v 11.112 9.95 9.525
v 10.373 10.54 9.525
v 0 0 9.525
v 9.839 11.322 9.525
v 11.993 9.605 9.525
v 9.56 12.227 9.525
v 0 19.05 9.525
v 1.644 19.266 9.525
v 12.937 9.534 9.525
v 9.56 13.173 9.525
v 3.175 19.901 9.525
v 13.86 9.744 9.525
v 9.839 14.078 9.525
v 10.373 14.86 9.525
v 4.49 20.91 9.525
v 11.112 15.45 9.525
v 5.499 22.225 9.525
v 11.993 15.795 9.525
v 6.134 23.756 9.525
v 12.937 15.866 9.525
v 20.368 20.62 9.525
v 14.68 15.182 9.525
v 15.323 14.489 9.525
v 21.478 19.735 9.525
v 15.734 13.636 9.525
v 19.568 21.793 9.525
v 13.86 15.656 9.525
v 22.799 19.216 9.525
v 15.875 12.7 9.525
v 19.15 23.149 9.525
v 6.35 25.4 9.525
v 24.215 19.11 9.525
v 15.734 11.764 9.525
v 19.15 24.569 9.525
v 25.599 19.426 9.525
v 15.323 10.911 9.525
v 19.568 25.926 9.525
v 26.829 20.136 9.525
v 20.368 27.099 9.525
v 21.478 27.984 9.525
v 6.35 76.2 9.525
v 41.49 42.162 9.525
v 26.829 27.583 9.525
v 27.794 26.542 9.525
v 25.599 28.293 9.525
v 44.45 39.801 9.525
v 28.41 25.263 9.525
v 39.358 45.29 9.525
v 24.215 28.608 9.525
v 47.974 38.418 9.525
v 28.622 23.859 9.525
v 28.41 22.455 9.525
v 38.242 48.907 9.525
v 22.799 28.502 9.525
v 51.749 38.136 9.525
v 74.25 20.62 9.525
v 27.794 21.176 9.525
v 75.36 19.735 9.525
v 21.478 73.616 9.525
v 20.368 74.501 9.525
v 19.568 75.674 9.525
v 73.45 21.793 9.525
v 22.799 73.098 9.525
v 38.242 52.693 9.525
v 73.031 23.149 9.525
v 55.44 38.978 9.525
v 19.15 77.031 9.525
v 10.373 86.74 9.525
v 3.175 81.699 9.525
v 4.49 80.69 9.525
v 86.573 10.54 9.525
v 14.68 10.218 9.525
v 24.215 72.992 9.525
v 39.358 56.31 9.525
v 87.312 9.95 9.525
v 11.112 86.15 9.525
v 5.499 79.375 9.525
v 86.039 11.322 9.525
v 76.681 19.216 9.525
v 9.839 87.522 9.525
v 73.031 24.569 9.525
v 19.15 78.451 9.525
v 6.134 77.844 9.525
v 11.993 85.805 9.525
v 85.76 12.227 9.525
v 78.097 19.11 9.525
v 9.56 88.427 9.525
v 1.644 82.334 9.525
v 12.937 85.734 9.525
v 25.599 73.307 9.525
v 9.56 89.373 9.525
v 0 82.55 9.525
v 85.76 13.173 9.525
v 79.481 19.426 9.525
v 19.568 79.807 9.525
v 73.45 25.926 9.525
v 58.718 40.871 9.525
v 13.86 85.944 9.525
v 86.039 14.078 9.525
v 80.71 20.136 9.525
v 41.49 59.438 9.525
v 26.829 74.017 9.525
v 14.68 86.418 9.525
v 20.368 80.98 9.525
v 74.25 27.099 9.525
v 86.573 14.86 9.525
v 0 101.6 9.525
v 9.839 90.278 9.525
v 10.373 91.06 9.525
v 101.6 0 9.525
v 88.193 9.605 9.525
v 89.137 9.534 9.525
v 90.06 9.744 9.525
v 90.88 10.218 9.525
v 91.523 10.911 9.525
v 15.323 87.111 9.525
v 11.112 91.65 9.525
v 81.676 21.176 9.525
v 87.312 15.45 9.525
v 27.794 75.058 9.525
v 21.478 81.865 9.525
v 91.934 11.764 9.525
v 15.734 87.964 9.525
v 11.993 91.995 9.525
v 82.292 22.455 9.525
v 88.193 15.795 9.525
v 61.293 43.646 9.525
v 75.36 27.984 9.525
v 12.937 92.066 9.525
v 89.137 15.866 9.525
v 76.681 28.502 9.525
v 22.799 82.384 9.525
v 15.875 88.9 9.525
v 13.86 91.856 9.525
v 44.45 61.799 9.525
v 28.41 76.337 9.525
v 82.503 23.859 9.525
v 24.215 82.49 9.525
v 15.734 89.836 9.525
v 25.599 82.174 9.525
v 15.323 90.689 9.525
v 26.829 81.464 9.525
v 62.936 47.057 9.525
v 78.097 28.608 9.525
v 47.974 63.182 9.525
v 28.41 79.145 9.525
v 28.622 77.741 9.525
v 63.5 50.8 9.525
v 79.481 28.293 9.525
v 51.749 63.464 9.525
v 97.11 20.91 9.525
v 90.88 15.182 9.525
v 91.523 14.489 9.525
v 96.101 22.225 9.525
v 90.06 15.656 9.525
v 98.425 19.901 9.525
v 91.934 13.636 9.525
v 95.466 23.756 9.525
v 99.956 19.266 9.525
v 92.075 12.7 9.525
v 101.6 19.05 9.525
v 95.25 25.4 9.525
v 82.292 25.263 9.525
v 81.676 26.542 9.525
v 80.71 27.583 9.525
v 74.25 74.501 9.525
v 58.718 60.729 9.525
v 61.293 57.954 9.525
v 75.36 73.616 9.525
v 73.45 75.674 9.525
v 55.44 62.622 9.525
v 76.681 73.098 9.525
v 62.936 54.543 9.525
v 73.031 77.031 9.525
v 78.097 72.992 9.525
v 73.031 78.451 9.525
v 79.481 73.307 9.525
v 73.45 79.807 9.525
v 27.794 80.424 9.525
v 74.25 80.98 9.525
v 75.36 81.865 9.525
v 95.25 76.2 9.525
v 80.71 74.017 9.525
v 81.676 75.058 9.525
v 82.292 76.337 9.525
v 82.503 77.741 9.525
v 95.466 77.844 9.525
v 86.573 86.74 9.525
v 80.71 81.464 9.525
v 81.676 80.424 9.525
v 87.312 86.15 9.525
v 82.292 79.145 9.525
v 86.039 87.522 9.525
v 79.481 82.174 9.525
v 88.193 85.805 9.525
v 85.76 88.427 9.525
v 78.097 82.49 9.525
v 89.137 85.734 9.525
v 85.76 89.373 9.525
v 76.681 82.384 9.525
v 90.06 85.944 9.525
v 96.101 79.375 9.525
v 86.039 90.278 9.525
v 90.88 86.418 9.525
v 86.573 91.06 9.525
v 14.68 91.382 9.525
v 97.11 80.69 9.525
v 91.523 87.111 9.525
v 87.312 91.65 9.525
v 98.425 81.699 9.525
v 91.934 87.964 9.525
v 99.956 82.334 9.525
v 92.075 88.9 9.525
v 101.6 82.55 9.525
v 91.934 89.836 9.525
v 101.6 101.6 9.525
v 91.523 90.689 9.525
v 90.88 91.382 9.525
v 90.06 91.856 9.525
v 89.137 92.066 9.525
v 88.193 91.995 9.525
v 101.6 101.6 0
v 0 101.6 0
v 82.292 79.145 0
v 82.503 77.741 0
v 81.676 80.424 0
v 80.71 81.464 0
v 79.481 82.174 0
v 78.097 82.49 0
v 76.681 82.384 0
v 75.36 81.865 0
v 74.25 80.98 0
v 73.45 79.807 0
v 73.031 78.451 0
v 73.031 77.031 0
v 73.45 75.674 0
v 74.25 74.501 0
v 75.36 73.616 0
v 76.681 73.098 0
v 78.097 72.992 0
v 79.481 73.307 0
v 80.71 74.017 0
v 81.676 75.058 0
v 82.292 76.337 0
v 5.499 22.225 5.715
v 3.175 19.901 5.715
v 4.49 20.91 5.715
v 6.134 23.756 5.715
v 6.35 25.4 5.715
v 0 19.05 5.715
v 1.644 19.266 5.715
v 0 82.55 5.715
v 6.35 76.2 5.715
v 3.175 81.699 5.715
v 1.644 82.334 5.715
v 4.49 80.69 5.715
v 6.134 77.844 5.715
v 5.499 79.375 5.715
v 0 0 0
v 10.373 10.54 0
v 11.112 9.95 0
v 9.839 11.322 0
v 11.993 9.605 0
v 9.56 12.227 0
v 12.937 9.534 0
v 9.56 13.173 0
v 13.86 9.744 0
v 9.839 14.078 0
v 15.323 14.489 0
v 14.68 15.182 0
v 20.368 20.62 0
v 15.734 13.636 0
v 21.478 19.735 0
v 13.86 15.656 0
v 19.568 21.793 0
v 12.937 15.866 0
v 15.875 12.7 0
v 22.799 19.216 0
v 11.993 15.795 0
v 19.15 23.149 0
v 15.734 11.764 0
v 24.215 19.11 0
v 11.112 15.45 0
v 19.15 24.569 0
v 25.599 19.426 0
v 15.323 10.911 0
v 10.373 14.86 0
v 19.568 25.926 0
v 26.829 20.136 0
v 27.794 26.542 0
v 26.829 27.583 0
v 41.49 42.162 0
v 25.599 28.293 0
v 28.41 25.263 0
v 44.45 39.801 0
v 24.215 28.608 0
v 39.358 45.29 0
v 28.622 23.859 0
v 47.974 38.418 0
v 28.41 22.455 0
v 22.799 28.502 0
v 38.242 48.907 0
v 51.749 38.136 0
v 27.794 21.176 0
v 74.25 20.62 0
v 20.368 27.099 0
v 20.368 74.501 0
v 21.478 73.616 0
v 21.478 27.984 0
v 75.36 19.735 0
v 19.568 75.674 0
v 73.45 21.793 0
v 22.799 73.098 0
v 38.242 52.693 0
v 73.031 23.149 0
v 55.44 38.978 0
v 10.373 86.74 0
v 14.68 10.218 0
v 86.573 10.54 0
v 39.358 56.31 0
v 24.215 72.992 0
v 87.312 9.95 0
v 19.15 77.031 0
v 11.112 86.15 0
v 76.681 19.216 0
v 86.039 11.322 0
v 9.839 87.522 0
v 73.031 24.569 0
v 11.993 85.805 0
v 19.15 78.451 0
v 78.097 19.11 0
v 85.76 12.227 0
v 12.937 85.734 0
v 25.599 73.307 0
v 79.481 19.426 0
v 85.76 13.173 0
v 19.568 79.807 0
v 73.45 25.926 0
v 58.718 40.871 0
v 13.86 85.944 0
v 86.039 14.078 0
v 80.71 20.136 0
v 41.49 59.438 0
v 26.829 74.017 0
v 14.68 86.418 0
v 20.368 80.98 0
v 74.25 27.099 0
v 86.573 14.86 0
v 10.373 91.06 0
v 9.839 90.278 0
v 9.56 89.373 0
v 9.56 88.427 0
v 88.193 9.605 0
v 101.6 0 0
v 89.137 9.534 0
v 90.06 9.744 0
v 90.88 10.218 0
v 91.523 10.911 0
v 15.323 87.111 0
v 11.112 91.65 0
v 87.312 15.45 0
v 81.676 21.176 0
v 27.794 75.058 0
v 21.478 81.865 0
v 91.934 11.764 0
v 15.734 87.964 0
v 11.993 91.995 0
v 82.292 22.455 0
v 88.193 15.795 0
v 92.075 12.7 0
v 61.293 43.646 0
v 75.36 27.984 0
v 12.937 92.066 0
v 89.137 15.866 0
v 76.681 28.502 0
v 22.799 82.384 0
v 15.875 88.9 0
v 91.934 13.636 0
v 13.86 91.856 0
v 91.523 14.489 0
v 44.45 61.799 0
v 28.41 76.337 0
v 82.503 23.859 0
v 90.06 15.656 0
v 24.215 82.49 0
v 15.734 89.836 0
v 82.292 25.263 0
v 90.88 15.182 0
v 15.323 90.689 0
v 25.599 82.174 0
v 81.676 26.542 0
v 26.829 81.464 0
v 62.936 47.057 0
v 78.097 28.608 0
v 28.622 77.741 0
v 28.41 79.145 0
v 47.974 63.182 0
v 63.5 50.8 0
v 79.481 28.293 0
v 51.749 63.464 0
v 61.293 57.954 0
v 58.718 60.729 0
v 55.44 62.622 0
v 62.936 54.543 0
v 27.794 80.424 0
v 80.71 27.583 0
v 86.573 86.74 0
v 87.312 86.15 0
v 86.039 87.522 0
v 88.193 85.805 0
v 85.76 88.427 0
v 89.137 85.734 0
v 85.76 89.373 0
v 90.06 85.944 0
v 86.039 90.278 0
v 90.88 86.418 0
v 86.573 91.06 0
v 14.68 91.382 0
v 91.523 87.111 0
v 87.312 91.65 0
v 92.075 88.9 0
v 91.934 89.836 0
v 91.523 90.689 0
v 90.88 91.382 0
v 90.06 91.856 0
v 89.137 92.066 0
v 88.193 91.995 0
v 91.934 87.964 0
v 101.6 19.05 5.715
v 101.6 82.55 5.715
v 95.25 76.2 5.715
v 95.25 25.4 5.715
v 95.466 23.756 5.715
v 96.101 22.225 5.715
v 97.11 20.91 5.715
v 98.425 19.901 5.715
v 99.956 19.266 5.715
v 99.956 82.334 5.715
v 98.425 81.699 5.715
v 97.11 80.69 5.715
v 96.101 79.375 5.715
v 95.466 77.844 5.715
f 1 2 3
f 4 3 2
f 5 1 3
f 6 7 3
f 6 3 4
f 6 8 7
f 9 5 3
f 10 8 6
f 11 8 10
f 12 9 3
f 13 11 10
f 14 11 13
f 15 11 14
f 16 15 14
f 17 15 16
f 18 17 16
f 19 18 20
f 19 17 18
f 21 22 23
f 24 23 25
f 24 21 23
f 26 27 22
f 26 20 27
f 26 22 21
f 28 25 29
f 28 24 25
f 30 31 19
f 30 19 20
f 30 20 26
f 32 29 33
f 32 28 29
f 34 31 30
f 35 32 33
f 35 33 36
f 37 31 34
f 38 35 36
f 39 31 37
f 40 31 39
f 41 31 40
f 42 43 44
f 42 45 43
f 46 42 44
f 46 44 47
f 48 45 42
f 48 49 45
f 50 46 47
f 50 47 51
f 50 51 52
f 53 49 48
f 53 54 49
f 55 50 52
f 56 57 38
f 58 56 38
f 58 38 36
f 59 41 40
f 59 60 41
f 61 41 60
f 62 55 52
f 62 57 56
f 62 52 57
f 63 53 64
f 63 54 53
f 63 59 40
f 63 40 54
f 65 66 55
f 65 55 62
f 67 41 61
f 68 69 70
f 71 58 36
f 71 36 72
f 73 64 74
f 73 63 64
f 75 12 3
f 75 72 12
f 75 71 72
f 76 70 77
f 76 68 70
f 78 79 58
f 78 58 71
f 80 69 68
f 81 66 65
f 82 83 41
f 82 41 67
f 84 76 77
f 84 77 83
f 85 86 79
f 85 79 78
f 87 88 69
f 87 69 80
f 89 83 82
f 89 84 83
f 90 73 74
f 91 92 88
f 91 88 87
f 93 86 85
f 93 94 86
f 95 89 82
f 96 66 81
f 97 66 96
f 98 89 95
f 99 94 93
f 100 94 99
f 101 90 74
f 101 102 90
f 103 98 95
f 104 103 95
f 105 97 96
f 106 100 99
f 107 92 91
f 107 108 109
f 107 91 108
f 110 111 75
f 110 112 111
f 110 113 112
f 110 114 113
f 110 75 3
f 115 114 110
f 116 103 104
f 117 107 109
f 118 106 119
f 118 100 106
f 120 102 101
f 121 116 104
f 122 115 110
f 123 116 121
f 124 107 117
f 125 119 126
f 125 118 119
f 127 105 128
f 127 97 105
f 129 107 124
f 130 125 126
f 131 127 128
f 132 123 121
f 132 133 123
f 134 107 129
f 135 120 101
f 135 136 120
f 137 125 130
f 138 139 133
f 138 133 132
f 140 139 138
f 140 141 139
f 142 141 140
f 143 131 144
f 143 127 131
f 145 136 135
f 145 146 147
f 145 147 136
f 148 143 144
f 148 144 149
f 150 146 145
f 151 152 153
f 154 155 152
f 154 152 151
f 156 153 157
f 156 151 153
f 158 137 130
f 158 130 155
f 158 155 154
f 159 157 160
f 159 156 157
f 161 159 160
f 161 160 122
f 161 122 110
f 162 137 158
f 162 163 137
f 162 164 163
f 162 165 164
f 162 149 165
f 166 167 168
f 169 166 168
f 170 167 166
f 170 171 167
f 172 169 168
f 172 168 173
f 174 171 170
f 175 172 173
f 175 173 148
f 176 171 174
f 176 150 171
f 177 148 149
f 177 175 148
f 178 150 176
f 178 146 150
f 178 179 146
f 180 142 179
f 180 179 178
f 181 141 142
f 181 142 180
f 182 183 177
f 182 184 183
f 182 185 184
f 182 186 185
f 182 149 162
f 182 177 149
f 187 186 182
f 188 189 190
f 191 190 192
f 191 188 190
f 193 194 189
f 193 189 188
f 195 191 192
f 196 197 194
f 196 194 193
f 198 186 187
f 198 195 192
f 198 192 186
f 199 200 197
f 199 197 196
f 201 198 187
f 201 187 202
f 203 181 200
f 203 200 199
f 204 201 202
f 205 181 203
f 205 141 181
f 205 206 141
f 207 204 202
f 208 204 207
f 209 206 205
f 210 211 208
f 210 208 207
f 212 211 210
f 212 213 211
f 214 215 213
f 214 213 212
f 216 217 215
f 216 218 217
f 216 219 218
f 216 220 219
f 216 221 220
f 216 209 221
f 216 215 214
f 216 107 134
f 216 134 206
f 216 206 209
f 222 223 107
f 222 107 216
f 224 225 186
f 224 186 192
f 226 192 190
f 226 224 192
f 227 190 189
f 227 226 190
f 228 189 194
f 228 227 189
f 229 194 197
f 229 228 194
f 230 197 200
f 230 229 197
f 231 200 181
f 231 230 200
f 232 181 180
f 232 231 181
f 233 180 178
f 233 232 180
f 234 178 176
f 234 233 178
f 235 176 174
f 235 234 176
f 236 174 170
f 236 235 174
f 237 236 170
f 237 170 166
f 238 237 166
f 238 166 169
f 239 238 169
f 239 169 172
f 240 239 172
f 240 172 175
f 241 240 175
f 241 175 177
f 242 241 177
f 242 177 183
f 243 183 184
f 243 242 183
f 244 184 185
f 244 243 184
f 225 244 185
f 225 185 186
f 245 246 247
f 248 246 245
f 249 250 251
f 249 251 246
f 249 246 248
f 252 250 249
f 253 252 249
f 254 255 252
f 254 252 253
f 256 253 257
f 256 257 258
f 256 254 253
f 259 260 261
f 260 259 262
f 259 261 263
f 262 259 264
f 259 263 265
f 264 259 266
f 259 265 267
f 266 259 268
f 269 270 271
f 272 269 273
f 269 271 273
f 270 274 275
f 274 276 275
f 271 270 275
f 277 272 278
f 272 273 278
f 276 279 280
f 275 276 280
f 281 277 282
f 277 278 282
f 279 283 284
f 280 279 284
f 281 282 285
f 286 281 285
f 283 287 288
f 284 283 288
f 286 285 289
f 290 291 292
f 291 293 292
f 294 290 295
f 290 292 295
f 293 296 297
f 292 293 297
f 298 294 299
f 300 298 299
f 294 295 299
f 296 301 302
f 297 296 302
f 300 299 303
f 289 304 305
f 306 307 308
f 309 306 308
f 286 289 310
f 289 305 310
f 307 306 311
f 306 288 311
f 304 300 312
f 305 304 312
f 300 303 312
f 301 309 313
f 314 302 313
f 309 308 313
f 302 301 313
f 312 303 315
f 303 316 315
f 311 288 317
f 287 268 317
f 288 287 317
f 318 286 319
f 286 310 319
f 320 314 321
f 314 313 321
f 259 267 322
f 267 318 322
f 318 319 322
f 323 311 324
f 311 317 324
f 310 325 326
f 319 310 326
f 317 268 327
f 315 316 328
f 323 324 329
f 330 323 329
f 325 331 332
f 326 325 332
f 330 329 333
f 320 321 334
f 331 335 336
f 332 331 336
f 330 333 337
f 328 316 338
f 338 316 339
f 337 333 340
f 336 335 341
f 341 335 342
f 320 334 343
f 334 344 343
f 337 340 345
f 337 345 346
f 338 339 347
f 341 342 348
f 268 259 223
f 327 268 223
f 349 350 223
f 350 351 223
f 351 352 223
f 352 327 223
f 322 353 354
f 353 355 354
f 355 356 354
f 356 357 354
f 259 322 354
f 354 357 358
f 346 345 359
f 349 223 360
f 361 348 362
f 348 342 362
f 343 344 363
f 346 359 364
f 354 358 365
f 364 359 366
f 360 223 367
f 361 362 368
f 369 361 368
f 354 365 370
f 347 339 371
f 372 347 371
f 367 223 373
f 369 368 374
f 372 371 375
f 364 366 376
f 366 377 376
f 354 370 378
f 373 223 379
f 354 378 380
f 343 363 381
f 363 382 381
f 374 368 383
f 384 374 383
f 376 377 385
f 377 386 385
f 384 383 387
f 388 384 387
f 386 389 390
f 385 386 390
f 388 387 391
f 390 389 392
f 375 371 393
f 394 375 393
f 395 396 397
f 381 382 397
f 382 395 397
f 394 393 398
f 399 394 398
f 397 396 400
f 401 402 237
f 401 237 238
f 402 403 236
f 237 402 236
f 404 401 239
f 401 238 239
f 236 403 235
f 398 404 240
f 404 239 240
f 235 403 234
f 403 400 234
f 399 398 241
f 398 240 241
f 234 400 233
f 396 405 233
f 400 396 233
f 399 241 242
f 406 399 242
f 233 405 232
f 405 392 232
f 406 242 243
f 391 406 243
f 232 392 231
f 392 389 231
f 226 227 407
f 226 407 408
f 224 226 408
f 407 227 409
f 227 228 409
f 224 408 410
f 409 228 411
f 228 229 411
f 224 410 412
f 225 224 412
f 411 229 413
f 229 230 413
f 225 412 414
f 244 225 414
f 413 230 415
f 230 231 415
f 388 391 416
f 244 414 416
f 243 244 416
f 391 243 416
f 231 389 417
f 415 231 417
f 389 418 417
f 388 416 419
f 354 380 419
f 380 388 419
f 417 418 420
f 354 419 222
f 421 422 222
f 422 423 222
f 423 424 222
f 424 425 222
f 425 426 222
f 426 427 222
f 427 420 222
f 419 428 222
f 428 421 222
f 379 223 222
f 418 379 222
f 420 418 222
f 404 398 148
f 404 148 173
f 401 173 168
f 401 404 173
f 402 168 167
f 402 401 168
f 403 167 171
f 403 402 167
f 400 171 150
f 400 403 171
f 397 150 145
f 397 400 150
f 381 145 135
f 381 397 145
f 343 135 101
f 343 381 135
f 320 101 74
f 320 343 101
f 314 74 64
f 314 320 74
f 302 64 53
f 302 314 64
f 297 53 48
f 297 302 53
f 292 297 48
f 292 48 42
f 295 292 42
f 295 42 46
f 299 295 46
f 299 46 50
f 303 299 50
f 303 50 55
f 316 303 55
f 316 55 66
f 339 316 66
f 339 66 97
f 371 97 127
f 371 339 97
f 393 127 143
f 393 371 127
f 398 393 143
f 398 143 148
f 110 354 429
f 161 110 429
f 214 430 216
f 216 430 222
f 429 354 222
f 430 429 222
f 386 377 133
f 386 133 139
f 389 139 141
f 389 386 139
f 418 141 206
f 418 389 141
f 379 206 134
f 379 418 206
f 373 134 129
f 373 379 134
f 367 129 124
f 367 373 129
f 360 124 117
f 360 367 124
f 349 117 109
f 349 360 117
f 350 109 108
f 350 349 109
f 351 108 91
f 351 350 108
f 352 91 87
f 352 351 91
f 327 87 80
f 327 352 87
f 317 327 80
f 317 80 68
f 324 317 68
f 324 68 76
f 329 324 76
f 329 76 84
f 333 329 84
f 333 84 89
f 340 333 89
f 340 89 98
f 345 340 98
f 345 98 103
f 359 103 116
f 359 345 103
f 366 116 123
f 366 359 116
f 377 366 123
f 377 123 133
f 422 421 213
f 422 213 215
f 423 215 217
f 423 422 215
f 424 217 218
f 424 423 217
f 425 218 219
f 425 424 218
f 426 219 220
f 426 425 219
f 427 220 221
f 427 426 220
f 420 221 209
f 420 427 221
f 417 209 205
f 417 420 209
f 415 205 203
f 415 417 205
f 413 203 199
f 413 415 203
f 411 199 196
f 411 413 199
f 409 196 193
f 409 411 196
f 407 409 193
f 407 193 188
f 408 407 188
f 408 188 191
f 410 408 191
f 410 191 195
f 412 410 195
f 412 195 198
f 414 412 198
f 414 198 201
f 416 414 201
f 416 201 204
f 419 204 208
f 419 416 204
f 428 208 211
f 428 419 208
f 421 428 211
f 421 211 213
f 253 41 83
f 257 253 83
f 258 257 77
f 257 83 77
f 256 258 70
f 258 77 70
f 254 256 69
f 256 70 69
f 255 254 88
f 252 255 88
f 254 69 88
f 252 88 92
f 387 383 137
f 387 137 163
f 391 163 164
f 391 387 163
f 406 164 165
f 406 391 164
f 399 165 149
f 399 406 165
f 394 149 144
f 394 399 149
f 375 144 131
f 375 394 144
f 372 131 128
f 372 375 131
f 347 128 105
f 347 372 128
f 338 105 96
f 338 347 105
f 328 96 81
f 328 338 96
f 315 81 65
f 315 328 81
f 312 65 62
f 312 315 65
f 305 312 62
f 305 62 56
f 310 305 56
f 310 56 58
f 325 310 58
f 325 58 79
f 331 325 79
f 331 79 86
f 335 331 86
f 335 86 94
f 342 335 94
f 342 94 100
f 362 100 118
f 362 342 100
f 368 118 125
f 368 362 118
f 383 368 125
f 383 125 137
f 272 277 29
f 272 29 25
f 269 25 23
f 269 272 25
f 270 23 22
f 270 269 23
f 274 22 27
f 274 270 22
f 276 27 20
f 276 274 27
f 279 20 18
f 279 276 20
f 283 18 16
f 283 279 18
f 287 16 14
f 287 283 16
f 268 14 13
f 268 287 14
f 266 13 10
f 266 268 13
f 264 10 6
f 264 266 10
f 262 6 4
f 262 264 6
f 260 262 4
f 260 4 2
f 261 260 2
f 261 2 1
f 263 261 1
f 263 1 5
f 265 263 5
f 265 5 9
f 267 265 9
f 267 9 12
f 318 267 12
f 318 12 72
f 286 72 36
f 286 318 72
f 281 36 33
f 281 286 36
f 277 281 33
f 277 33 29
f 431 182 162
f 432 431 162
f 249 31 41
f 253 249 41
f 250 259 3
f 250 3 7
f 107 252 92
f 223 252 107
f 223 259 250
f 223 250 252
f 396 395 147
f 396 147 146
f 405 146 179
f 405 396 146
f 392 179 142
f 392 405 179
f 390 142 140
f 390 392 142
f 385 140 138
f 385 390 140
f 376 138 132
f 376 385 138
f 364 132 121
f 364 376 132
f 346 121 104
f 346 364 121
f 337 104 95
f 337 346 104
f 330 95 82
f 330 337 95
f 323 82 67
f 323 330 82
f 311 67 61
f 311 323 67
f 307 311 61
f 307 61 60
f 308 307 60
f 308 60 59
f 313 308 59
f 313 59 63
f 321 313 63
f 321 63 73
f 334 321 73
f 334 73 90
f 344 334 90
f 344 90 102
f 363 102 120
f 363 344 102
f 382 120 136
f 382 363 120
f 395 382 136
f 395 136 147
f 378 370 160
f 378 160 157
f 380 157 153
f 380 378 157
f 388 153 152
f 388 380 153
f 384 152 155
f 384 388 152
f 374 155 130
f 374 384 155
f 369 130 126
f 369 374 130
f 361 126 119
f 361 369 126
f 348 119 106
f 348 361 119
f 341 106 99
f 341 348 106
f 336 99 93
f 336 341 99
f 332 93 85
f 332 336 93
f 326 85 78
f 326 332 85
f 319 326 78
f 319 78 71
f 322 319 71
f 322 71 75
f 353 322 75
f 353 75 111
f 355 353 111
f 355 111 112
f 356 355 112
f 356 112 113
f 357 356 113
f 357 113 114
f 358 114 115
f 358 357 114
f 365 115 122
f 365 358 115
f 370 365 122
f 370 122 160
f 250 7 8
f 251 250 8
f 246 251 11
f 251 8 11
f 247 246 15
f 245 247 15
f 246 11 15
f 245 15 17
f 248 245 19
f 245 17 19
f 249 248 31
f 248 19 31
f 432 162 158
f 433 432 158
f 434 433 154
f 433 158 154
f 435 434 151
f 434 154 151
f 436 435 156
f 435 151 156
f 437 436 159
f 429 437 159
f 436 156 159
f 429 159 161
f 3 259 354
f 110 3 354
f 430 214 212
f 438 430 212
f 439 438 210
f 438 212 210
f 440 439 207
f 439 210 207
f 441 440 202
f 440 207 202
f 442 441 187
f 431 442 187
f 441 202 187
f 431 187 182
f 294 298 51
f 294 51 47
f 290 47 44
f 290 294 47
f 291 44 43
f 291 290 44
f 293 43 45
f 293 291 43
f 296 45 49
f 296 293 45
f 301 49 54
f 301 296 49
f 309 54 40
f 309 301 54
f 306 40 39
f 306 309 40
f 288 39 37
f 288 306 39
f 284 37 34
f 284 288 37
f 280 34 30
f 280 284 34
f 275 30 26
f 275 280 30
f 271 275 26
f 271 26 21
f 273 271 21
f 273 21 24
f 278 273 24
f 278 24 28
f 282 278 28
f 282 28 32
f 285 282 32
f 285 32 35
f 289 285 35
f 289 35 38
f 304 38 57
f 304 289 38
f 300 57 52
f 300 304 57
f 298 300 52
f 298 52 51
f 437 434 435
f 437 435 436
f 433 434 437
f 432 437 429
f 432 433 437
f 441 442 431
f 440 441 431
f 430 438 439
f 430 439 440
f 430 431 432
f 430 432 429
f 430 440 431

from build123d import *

# Parameters (mm, degrees)
F0_W     = 101.6
F0_H     = 101.6
F0_R     = 3.175
F0_R_2   = 4.7625
F0_R_3   = 12.7
F1_DEPTH = 9.525
F3_DEPTH = 3.81


with BuildPart() as f1:
    # F0 (on Top) → F1 (new body)
    with BuildSketch(Plane.XY):
        with Locations((50.8, 50.8)):
            Rectangle(F0_W, F0_H)
        with Locations((12.7, 12.7)):
            Circle(F0_R, mode=Mode.SUBTRACT)
        with Locations((23.859232, 23.859232)):
            Circle(F0_R_2, mode=Mode.SUBTRACT)
        with Locations((50.8, 50.8)):
            Circle(F0_R_3, mode=Mode.SUBTRACT)
        with Locations((77.740768, 23.859232)):
            Circle(F0_R_2, mode=Mode.SUBTRACT)
        with Locations((88.9, 12.7)):
            Circle(F0_R, mode=Mode.SUBTRACT)
        with Locations((23.859232, 77.740768)):
            Circle(F0_R_2, mode=Mode.SUBTRACT)
        with Locations((12.7, 88.9)):
            Circle(F0_R, mode=Mode.SUBTRACT)
        with Locations((77.740768, 77.740768)):
            Circle(F0_R_2, mode=Mode.SUBTRACT)
        with Locations((88.9, 88.9)):
            Circle(F0_R, mode=Mode.SUBTRACT)
    extrude(amount=F1_DEPTH)

    # F2 (on face) → F3 (cut)
    with BuildSketch(Plane.XY.offset(9.525)):
        with BuildLine():
            Line((6.35, 25.4), (6.35, 76.2))
            ThreePointArc((6.35, 76.2), (4.490128, 80.690128), (0, 82.55))
            Line((0, 82.55), (0, 19.05))
            ThreePointArc((0, 19.05), (4.490128, 20.909872), (6.35, 25.4))
        make_face()
        with BuildLine():
            Line((101.6, 19.05), (101.6, 82.55))
            ThreePointArc((101.6, 82.55), (97.109872, 80.690128), (95.25, 76.2))
            Line((95.25, 76.2), (95.25, 25.4))
            ThreePointArc((95.25, 25.4), (97.109872, 20.909872), (101.6, 19.05))
        make_face()
    extrude(amount=-F3_DEPTH, mode=Mode.SUBTRACT)


solid = f1.part
